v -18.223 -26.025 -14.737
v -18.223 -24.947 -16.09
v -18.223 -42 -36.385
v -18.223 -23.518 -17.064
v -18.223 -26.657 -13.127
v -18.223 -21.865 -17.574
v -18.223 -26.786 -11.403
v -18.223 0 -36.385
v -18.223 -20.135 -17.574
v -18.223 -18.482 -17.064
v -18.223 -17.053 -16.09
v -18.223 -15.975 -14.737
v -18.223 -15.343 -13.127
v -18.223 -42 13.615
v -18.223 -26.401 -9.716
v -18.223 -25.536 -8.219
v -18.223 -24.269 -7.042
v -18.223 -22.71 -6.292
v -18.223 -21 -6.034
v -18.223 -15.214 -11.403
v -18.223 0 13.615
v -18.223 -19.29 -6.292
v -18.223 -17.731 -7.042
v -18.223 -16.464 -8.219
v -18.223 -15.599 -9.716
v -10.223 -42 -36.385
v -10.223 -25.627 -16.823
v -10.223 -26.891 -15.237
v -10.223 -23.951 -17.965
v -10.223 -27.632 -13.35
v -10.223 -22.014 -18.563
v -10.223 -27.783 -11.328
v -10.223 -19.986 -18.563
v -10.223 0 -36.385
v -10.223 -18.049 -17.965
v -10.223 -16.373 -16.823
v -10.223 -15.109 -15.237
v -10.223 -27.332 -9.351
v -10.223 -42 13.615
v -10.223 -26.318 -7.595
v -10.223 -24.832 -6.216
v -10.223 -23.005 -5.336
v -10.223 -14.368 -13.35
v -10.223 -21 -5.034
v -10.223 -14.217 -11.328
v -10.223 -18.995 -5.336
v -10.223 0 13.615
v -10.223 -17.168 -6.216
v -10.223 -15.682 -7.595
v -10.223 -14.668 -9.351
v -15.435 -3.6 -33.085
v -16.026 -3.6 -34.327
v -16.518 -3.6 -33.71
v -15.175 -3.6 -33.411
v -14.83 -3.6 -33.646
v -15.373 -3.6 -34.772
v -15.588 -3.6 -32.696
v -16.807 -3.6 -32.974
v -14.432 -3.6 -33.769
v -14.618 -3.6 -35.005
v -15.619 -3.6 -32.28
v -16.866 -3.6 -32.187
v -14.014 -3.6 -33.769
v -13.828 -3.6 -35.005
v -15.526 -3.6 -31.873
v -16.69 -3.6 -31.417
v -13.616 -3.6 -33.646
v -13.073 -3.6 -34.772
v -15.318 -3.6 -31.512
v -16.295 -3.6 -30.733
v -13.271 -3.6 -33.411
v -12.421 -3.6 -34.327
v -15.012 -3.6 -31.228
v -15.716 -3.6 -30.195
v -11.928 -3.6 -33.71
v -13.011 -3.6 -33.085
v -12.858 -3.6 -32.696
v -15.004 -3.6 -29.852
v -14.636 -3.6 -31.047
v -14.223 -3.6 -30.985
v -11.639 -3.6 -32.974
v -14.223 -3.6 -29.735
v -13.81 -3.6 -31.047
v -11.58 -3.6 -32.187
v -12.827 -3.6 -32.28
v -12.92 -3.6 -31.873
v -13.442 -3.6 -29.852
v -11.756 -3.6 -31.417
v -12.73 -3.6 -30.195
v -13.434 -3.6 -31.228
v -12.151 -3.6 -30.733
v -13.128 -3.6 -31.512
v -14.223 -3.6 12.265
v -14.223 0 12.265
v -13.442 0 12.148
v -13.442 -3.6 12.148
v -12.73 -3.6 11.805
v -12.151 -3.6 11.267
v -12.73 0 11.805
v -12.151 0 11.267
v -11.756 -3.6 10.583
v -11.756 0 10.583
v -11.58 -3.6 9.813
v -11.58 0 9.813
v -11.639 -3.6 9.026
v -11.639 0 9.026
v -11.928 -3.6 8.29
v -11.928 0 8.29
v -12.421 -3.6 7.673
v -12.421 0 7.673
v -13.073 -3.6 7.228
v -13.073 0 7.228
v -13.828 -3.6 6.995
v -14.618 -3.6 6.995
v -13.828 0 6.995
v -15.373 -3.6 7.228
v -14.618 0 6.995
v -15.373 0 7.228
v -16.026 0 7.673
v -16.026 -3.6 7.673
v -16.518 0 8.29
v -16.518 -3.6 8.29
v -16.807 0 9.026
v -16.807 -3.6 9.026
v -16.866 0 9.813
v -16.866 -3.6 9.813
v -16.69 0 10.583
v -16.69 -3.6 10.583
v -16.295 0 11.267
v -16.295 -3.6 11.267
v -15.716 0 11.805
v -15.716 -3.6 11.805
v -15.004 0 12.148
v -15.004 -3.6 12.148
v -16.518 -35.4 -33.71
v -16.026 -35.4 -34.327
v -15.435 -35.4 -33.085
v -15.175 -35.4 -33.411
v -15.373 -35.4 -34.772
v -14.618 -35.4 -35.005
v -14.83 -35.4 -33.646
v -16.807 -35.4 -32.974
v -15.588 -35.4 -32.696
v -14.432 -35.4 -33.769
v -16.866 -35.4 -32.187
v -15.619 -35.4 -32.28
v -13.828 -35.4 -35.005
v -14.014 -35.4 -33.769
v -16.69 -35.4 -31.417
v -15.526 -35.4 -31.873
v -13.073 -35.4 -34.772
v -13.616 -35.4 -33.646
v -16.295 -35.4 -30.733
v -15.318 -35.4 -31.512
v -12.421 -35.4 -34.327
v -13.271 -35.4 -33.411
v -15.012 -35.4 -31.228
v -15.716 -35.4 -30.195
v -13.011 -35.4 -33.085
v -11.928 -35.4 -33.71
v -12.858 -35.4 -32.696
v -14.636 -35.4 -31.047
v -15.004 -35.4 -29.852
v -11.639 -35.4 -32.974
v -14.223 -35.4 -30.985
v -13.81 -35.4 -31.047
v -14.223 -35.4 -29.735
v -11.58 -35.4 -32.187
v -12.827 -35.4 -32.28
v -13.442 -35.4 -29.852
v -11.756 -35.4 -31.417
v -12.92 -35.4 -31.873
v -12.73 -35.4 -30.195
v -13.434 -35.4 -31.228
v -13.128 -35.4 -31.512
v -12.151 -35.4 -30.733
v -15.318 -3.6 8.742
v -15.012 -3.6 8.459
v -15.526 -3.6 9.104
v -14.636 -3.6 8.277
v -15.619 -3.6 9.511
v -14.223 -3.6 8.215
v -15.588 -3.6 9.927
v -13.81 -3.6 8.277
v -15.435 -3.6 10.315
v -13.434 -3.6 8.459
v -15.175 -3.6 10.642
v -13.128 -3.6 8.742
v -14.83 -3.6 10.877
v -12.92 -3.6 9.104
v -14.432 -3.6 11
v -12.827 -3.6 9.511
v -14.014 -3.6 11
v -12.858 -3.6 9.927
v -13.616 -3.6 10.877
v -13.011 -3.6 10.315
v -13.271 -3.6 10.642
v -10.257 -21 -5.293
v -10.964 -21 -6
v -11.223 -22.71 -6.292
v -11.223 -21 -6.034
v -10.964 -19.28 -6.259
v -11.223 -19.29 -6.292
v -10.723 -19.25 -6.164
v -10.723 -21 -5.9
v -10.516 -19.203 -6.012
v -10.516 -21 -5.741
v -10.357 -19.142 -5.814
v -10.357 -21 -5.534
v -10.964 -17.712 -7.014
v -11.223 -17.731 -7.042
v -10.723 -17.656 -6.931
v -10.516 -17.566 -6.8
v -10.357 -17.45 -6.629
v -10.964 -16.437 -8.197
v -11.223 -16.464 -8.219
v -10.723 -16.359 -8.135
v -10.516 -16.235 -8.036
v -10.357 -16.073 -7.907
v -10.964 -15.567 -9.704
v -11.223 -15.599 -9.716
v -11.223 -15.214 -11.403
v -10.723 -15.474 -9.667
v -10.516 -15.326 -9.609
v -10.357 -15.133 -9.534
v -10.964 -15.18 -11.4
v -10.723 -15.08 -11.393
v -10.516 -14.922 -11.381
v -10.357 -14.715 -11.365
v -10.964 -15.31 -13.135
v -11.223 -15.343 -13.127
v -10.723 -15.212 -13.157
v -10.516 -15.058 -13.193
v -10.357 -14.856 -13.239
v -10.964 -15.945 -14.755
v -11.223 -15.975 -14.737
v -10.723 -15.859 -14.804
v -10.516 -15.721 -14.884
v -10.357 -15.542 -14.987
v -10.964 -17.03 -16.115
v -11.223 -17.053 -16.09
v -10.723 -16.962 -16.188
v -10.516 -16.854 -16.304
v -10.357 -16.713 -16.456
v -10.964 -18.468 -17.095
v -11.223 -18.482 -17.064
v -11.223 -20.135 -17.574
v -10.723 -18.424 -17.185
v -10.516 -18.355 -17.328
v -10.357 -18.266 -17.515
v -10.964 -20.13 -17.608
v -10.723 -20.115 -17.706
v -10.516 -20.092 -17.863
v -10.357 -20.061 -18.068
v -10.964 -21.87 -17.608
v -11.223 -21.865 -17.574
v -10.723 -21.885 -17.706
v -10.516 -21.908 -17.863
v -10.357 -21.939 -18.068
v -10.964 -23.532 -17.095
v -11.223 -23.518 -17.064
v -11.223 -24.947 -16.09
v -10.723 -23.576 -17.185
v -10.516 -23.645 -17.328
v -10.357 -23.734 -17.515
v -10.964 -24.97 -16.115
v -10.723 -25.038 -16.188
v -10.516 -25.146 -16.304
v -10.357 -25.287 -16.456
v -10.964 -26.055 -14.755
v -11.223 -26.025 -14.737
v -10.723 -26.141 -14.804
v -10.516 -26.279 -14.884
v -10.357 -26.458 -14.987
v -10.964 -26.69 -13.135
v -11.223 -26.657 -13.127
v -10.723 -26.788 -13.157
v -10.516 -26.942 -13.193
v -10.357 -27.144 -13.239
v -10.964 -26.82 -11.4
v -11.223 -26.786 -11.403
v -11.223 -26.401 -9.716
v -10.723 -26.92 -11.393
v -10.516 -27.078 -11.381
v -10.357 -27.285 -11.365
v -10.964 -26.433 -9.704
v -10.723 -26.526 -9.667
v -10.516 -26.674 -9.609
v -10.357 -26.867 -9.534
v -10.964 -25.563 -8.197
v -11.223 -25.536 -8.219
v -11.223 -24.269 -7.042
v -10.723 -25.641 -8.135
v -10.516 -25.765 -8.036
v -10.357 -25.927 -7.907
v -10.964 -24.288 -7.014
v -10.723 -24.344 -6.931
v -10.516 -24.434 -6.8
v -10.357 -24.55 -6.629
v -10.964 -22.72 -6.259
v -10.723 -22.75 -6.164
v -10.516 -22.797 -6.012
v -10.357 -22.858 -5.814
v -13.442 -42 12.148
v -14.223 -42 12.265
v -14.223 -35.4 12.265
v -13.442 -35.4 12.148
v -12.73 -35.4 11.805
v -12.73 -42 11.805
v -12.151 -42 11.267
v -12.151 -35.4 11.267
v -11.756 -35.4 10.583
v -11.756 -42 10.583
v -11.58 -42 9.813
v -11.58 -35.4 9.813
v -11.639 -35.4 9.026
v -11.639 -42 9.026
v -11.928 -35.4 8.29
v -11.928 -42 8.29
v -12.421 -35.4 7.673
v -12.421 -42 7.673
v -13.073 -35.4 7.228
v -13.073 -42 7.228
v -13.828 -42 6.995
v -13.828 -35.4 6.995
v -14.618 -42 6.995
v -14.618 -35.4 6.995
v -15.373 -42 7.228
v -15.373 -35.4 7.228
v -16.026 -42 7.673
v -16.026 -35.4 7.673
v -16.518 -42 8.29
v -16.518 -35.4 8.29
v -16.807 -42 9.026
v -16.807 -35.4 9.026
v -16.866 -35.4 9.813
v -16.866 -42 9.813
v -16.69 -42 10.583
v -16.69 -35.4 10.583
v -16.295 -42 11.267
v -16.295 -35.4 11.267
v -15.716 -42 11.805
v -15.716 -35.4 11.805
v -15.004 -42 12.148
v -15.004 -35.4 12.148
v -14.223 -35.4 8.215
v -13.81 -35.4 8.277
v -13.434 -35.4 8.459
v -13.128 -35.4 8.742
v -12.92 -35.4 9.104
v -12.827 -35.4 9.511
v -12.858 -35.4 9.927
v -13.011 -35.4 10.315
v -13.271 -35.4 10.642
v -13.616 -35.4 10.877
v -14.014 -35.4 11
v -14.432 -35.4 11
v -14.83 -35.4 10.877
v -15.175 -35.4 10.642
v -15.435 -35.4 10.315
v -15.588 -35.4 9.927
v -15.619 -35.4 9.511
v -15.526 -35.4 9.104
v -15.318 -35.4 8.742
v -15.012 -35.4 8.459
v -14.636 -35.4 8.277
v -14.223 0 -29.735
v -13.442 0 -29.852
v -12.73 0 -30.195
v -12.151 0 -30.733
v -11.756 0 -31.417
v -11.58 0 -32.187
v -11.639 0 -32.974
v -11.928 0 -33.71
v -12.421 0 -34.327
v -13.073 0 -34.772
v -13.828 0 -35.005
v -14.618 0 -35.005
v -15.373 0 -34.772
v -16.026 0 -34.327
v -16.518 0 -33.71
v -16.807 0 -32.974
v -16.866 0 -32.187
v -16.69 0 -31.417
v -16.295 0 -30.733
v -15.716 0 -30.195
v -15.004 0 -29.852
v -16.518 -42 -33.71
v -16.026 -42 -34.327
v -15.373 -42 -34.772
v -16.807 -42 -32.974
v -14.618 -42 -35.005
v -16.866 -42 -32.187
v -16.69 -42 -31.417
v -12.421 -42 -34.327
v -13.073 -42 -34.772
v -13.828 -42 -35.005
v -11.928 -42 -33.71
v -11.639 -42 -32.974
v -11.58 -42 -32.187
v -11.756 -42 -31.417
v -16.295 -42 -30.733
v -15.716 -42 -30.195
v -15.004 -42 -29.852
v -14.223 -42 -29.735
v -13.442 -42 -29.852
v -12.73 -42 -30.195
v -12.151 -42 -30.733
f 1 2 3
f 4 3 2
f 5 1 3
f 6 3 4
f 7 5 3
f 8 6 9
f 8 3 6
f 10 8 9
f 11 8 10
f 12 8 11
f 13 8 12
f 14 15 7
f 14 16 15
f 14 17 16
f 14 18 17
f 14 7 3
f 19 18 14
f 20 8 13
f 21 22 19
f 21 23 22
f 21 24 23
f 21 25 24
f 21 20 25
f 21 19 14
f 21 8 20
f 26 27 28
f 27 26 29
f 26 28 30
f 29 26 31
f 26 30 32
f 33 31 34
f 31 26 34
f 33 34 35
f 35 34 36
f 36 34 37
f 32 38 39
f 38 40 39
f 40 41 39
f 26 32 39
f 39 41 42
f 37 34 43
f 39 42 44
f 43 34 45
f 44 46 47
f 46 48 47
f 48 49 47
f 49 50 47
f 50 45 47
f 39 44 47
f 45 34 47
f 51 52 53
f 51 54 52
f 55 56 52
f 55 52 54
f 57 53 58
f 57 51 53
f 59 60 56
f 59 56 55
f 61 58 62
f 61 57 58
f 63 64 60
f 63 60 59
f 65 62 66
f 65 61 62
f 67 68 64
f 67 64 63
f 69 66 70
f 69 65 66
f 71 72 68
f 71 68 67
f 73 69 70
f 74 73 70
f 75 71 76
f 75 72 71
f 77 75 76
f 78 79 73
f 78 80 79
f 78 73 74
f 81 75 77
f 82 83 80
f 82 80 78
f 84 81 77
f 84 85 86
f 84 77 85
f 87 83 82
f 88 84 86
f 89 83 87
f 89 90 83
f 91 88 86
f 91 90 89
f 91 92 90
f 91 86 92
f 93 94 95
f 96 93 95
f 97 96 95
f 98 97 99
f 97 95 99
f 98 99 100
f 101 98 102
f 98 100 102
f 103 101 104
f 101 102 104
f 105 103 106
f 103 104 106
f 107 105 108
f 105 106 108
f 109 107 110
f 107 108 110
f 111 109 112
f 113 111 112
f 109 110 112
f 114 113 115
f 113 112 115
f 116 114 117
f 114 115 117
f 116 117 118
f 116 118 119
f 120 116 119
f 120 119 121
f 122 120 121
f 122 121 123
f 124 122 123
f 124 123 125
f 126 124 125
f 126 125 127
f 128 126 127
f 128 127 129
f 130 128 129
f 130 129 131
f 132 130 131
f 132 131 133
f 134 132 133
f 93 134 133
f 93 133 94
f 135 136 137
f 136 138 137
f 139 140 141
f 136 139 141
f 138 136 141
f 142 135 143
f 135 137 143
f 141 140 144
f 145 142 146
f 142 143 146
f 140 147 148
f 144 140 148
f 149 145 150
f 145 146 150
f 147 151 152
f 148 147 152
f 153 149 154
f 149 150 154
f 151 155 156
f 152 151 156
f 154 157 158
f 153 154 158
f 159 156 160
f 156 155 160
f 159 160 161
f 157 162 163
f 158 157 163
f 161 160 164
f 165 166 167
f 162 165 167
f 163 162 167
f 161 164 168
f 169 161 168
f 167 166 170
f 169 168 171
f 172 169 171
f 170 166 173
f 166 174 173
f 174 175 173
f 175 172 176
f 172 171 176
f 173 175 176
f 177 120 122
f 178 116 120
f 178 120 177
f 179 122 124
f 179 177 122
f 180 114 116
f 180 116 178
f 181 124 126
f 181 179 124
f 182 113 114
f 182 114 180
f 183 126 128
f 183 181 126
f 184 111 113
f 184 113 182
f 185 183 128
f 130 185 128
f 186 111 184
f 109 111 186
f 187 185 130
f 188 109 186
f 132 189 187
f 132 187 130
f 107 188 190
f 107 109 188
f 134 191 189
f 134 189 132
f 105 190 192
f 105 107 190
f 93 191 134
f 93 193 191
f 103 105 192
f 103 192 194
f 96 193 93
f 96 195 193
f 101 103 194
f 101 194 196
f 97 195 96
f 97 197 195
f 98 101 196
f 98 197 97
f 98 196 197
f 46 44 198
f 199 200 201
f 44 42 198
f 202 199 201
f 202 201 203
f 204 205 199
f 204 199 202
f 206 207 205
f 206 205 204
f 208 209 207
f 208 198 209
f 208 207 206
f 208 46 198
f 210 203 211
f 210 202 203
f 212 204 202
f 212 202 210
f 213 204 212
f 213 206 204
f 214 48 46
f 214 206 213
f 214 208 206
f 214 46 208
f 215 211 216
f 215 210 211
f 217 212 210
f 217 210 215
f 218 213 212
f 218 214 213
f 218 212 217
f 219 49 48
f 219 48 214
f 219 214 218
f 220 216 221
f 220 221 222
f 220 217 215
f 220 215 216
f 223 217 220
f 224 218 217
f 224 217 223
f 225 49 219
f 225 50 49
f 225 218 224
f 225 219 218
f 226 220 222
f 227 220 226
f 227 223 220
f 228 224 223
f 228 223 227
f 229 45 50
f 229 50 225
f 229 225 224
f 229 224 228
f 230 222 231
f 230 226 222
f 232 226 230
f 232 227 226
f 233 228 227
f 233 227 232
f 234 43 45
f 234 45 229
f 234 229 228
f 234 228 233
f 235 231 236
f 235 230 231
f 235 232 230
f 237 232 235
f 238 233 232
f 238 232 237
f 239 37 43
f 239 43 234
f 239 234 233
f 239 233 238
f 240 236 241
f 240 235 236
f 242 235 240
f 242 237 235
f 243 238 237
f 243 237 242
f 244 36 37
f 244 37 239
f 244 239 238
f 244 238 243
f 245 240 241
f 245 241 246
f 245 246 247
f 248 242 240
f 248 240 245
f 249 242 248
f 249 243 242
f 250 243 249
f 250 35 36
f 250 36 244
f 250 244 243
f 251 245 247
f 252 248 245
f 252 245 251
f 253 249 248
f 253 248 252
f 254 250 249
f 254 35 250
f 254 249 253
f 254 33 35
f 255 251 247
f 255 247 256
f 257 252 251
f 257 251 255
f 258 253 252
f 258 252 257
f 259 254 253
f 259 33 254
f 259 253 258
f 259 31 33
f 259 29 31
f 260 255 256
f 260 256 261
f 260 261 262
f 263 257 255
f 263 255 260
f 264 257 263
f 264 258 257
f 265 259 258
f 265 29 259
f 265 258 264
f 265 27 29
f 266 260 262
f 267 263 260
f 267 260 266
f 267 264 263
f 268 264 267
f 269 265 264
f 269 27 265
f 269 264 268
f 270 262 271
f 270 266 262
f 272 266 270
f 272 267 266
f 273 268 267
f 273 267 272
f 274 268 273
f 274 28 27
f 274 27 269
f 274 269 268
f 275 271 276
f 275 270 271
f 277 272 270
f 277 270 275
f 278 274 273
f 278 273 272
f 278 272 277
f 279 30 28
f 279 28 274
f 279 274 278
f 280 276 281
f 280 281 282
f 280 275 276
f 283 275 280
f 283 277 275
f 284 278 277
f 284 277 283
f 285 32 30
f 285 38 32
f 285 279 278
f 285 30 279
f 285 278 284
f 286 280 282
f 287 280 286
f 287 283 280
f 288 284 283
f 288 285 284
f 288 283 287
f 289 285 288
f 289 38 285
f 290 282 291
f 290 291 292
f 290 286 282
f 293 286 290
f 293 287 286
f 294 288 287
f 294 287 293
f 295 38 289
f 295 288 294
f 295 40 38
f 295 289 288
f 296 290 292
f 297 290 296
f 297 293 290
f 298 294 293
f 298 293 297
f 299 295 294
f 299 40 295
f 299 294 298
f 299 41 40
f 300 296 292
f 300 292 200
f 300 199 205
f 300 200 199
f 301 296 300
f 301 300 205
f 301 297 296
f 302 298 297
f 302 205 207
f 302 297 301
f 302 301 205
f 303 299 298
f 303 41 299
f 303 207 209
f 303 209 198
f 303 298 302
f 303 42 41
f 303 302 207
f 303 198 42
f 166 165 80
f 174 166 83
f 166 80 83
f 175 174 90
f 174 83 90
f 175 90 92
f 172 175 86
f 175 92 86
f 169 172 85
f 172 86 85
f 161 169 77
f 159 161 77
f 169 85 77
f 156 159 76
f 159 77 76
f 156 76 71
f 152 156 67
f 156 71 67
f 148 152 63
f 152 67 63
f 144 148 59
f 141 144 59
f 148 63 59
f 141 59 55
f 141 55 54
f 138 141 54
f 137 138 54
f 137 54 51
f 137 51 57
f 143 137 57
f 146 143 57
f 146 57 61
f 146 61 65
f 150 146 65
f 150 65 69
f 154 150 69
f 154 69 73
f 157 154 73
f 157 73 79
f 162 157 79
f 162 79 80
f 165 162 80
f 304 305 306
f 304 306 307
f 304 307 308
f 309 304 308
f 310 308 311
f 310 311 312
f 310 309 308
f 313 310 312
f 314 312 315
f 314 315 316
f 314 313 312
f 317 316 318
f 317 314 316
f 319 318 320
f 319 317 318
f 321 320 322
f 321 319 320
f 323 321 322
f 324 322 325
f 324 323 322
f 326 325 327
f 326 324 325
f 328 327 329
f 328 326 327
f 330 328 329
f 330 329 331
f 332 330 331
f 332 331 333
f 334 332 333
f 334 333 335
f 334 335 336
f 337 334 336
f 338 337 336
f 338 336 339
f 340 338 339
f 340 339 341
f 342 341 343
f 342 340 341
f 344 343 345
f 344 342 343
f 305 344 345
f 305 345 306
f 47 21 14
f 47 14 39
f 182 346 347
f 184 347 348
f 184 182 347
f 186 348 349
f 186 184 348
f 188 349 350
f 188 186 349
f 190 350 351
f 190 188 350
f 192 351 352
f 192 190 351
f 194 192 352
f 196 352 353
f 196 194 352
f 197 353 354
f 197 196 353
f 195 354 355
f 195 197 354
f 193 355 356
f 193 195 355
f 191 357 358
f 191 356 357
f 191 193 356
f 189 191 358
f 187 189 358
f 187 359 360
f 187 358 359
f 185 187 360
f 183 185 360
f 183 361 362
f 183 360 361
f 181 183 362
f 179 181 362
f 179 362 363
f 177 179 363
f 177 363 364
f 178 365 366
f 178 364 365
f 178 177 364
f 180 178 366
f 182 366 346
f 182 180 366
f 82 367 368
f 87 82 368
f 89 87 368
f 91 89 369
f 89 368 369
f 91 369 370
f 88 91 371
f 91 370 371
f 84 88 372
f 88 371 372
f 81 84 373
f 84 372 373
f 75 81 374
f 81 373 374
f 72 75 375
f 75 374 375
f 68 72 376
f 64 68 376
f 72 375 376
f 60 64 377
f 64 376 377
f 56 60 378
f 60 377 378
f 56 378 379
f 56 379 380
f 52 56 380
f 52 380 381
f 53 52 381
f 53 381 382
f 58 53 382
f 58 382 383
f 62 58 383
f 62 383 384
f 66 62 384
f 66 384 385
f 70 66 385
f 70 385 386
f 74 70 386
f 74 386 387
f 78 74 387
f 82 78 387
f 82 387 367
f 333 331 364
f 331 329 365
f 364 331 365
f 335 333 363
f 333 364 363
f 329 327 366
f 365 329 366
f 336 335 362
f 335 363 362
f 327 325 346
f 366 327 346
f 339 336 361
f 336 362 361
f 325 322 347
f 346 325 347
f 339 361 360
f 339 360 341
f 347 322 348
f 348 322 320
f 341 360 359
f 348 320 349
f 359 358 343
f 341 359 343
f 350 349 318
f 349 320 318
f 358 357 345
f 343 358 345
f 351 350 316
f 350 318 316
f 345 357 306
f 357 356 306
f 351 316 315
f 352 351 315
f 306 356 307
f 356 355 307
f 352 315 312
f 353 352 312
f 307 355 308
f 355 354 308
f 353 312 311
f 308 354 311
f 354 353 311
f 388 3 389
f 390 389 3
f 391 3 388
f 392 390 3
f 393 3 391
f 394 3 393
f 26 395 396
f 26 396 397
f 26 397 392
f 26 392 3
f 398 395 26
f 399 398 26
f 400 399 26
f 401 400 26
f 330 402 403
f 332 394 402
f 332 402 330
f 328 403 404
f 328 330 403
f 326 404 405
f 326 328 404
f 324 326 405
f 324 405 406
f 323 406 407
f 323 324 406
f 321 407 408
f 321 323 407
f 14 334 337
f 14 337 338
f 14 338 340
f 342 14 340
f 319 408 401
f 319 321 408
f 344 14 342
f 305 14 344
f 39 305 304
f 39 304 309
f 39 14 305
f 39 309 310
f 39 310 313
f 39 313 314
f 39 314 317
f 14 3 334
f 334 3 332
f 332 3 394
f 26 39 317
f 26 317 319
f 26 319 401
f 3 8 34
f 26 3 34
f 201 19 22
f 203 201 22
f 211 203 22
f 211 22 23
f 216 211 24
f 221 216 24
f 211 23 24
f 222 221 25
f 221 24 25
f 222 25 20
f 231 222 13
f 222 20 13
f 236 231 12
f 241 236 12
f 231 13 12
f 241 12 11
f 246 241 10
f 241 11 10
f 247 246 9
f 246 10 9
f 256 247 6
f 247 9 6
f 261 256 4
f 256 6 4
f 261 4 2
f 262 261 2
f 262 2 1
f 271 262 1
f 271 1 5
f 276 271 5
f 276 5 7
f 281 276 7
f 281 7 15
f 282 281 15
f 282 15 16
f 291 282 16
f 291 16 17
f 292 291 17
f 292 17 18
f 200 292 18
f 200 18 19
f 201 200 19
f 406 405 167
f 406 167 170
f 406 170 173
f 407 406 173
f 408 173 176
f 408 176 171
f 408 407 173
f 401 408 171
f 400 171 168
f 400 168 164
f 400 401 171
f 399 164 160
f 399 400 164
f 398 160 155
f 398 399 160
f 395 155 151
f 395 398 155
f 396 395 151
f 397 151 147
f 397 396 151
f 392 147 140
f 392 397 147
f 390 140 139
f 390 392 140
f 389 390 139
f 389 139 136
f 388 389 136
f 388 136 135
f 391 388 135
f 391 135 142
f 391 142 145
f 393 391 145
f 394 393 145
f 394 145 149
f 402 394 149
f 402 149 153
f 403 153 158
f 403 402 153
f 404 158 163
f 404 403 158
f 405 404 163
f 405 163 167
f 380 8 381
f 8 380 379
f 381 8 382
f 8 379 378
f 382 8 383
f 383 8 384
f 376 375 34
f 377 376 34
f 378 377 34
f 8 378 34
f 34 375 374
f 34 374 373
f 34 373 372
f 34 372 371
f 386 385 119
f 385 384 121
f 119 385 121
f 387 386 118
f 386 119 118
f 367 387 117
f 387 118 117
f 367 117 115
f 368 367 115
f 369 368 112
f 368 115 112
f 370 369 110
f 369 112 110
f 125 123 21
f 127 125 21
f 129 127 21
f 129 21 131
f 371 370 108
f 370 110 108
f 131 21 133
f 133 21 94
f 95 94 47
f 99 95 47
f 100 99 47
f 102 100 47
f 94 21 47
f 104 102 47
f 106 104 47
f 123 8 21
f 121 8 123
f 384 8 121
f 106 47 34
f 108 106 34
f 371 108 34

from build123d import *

# Parameters (mm, degrees)
SKETCH1_W           = 25
SKETCH1_H           = 50
SKETCH1_R           = 3.4
BOSS_EXTRUDE1_DEPTH = 3
SKETCH2_W           = 50
SKETCH2_H           = 3
BOSS_EXTRUDE2_DEPTH = 8
SKETCH3_W           = 8
SKETCH3_H           = 50
BOSS_EXTRUDE3_DEPTH = 42
SKETCH4_R           = 2.65
CUT_EXTRUDE1_DEPTH  = 6.6
SKETCH5_R           = 5.802370205
CUT_EXTRUDE2_DEPTH  = 9
FILLET2_R           = 1
SKETCH6_R           = 12.6
BOSS_EXTRUDE4_DEPTH = 2
FILLET4_R           = 1
SKETCH8_R           = 1.589780168
SKETCH8_R_2         = 1.777428262
CUT_EXTRUDE3_DEPTH  = 10
SKETCH9_W           = 49.021678163
SKETCH9_H           = 20.976854622
CUT_EXTRUDE4_DEPTH  = 68.79439129
SKETCH10_R          = 1.4
CUT_EXTRUDE5_DEPTH  = 56.950783118


with BuildPart() as part:
    # Sketch1 → Boss-Extrude1 (new body)
    with BuildSketch(Plane(origin=(0, 0, 0), x_dir=(1, 0, 0), z_dir=(0, 1, 0))):
        with Locations((2.276951673, 11.384758364)):
            Rectangle(SKETCH1_W, SKETCH1_H)
        with Locations(Location((1.276951673, 11.384758364, 0), (0, 0, 270))):
            Circle(SKETCH1_R, mode=Mode.SUBTRACT)
    extrude(amount=BOSS_EXTRUDE1_DEPTH)

    # Sketch2 → Boss-Extrude2 (add)
    with BuildSketch(Plane.ZY.offset(10.223048327)):
        with Locations((-11.384758364, 1.5)):
            Rectangle(SKETCH2_W, SKETCH2_H)
    extrude(amount=BOSS_EXTRUDE2_DEPTH)

    # Sketch3 → Boss-Extrude3 (add)
    with BuildSketch(Plane.XZ):
        with Locations((-14.223048327, -11.384758364)):
            Rectangle(SKETCH3_W, SKETCH3_H)
    extrude(amount=BOSS_EXTRUDE3_DEPTH)

    # Sketch4 → Cut-Extrude1 (cut)
    with BuildSketch(Plane(origin=(0, 3, 0), x_dir=(1, 0, 0), z_dir=(0, 1, 0))):
        with Locations(Location((-14.223048327, 32.384758364, 0), (0, 0, 270))):
            Circle(SKETCH4_R)
        with Locations(Location((-14.223048327, -9.615241636, 0), (0, 0, 270))):
            Circle(SKETCH4_R)
    cut_extrude1 = extrude(amount=-CUT_EXTRUDE1_DEPTH, mode=Mode.SUBTRACT)

    # Mirror1: Cut-Extrude1 across plane
    add(cut_extrude1.mirror(Plane.ZX.offset(-19.5)), mode=Mode.SUBTRACT)

    # Sketch5 → Cut-Extrude2 (cut)
    with BuildSketch(Plane.ZY.offset(18.223048327)):
        with Locations((-11.836279124, -21)):
            Circle(SKETCH5_R)
    extrude(amount=-CUT_EXTRUDE2_DEPTH, mode=Mode.SUBTRACT)

    # Fillet2
    fillet2_edges = [part.edges().sort_by_distance(p)[0] for p in [
        (-10.223048327, -21, -17.638649329),
    ]]
    fillet(fillet2_edges, radius=FILLET2_R)

    # Mirror2: Cut-Extrude1 across plane
    add(cut_extrude1.mirror(Plane.ZY.offset(1.723048327)), mode=Mode.SUBTRACT)

    # Sketch6 → Boss-Extrude4 (add)
    with BuildSketch(Plane(origin=(0, 3, 0), x_dir=(1, 0, 0), z_dir=(0, 1, 0))):
        with BuildLine():
            Line((14.776951673, 5.825082115), (14.776951673, 16.944434614))
            ThreePointArc((14.776951673, 16.944434614), (-13.323048327, 11.384758364), (14.776951673, 5.825082115))
        make_face()
        with Locations(Location((1.276951673, 11.384758364, 0), (0, 0, 270))):
            Circle(SKETCH6_R, mode=Mode.SUBTRACT)
    extrude(amount=BOSS_EXTRUDE4_DEPTH)

    # Fillet4
    # the kernel refuses this fillet: 1 mm, written as the material it takes off along each edge
    with BuildSketch(Plane(origin=(14.776951673, 5, -3.325082115), x_dir=(0, -1, 0), z_dir=(0, 0, -1))) as fillet4_piece_1:
        with BuildLine():
            CenterArc((FILLET4_R, FILLET4_R), FILLET4_R, 180, 90)
            Line((0, FILLET4_R), (0, 0))
            Line((0, 0), (FILLET4_R, 0))
        make_face()
    extrude(amount=16.119352499, mode=Mode.SUBTRACT)

    # Sketch8 → Cut-Extrude3 (cut)
    with BuildSketch(Plane(origin=(0, 3, 0), x_dir=(1, 0, 0), z_dir=(0, 1, 0))):
        with Locations(Location((1.276951673, 19.884758364, 0), (0, 0, 270))):
            Circle(SKETCH8_R)
        with Locations(Location((1.276951673, 2.884758364, 0), (0, 0, 270))):
            Circle(SKETCH8_R_2)
    extrude(amount=-CUT_EXTRUDE3_DEPTH, mode=Mode.SUBTRACT)

    # Sketch9 → Cut-Extrude4 (cut, through all)
    with BuildSketch(Plane.XY.offset(13.615241636)):
        with Locations((-9.733887409, 10.488427311)):
            Rectangle(SKETCH9_W, SKETCH9_H)
    extrude(amount=-CUT_EXTRUDE4_DEPTH, mode=Mode.SUBTRACT)

    # Sketch10 → Cut-Extrude5 (cut, through all)
    with BuildSketch(Plane(origin=(0, -3.6, 0), x_dir=(1, 0, 0), z_dir=(0, 1, 0))):
        with Locations(Location((-14.223048327, 32.384758364, 0), (0, 0, 270))):
            Circle(SKETCH10_R)
    cut_extrude5 = extrude(amount=-CUT_EXTRUDE5_DEPTH, mode=Mode.SUBTRACT)

    # Mirror3: Cut-Extrude5 across plane
    add(cut_extrude5.mirror(Plane.XY.offset(-11.384758364)), mode=Mode.SUBTRACT)


solid = part.part
